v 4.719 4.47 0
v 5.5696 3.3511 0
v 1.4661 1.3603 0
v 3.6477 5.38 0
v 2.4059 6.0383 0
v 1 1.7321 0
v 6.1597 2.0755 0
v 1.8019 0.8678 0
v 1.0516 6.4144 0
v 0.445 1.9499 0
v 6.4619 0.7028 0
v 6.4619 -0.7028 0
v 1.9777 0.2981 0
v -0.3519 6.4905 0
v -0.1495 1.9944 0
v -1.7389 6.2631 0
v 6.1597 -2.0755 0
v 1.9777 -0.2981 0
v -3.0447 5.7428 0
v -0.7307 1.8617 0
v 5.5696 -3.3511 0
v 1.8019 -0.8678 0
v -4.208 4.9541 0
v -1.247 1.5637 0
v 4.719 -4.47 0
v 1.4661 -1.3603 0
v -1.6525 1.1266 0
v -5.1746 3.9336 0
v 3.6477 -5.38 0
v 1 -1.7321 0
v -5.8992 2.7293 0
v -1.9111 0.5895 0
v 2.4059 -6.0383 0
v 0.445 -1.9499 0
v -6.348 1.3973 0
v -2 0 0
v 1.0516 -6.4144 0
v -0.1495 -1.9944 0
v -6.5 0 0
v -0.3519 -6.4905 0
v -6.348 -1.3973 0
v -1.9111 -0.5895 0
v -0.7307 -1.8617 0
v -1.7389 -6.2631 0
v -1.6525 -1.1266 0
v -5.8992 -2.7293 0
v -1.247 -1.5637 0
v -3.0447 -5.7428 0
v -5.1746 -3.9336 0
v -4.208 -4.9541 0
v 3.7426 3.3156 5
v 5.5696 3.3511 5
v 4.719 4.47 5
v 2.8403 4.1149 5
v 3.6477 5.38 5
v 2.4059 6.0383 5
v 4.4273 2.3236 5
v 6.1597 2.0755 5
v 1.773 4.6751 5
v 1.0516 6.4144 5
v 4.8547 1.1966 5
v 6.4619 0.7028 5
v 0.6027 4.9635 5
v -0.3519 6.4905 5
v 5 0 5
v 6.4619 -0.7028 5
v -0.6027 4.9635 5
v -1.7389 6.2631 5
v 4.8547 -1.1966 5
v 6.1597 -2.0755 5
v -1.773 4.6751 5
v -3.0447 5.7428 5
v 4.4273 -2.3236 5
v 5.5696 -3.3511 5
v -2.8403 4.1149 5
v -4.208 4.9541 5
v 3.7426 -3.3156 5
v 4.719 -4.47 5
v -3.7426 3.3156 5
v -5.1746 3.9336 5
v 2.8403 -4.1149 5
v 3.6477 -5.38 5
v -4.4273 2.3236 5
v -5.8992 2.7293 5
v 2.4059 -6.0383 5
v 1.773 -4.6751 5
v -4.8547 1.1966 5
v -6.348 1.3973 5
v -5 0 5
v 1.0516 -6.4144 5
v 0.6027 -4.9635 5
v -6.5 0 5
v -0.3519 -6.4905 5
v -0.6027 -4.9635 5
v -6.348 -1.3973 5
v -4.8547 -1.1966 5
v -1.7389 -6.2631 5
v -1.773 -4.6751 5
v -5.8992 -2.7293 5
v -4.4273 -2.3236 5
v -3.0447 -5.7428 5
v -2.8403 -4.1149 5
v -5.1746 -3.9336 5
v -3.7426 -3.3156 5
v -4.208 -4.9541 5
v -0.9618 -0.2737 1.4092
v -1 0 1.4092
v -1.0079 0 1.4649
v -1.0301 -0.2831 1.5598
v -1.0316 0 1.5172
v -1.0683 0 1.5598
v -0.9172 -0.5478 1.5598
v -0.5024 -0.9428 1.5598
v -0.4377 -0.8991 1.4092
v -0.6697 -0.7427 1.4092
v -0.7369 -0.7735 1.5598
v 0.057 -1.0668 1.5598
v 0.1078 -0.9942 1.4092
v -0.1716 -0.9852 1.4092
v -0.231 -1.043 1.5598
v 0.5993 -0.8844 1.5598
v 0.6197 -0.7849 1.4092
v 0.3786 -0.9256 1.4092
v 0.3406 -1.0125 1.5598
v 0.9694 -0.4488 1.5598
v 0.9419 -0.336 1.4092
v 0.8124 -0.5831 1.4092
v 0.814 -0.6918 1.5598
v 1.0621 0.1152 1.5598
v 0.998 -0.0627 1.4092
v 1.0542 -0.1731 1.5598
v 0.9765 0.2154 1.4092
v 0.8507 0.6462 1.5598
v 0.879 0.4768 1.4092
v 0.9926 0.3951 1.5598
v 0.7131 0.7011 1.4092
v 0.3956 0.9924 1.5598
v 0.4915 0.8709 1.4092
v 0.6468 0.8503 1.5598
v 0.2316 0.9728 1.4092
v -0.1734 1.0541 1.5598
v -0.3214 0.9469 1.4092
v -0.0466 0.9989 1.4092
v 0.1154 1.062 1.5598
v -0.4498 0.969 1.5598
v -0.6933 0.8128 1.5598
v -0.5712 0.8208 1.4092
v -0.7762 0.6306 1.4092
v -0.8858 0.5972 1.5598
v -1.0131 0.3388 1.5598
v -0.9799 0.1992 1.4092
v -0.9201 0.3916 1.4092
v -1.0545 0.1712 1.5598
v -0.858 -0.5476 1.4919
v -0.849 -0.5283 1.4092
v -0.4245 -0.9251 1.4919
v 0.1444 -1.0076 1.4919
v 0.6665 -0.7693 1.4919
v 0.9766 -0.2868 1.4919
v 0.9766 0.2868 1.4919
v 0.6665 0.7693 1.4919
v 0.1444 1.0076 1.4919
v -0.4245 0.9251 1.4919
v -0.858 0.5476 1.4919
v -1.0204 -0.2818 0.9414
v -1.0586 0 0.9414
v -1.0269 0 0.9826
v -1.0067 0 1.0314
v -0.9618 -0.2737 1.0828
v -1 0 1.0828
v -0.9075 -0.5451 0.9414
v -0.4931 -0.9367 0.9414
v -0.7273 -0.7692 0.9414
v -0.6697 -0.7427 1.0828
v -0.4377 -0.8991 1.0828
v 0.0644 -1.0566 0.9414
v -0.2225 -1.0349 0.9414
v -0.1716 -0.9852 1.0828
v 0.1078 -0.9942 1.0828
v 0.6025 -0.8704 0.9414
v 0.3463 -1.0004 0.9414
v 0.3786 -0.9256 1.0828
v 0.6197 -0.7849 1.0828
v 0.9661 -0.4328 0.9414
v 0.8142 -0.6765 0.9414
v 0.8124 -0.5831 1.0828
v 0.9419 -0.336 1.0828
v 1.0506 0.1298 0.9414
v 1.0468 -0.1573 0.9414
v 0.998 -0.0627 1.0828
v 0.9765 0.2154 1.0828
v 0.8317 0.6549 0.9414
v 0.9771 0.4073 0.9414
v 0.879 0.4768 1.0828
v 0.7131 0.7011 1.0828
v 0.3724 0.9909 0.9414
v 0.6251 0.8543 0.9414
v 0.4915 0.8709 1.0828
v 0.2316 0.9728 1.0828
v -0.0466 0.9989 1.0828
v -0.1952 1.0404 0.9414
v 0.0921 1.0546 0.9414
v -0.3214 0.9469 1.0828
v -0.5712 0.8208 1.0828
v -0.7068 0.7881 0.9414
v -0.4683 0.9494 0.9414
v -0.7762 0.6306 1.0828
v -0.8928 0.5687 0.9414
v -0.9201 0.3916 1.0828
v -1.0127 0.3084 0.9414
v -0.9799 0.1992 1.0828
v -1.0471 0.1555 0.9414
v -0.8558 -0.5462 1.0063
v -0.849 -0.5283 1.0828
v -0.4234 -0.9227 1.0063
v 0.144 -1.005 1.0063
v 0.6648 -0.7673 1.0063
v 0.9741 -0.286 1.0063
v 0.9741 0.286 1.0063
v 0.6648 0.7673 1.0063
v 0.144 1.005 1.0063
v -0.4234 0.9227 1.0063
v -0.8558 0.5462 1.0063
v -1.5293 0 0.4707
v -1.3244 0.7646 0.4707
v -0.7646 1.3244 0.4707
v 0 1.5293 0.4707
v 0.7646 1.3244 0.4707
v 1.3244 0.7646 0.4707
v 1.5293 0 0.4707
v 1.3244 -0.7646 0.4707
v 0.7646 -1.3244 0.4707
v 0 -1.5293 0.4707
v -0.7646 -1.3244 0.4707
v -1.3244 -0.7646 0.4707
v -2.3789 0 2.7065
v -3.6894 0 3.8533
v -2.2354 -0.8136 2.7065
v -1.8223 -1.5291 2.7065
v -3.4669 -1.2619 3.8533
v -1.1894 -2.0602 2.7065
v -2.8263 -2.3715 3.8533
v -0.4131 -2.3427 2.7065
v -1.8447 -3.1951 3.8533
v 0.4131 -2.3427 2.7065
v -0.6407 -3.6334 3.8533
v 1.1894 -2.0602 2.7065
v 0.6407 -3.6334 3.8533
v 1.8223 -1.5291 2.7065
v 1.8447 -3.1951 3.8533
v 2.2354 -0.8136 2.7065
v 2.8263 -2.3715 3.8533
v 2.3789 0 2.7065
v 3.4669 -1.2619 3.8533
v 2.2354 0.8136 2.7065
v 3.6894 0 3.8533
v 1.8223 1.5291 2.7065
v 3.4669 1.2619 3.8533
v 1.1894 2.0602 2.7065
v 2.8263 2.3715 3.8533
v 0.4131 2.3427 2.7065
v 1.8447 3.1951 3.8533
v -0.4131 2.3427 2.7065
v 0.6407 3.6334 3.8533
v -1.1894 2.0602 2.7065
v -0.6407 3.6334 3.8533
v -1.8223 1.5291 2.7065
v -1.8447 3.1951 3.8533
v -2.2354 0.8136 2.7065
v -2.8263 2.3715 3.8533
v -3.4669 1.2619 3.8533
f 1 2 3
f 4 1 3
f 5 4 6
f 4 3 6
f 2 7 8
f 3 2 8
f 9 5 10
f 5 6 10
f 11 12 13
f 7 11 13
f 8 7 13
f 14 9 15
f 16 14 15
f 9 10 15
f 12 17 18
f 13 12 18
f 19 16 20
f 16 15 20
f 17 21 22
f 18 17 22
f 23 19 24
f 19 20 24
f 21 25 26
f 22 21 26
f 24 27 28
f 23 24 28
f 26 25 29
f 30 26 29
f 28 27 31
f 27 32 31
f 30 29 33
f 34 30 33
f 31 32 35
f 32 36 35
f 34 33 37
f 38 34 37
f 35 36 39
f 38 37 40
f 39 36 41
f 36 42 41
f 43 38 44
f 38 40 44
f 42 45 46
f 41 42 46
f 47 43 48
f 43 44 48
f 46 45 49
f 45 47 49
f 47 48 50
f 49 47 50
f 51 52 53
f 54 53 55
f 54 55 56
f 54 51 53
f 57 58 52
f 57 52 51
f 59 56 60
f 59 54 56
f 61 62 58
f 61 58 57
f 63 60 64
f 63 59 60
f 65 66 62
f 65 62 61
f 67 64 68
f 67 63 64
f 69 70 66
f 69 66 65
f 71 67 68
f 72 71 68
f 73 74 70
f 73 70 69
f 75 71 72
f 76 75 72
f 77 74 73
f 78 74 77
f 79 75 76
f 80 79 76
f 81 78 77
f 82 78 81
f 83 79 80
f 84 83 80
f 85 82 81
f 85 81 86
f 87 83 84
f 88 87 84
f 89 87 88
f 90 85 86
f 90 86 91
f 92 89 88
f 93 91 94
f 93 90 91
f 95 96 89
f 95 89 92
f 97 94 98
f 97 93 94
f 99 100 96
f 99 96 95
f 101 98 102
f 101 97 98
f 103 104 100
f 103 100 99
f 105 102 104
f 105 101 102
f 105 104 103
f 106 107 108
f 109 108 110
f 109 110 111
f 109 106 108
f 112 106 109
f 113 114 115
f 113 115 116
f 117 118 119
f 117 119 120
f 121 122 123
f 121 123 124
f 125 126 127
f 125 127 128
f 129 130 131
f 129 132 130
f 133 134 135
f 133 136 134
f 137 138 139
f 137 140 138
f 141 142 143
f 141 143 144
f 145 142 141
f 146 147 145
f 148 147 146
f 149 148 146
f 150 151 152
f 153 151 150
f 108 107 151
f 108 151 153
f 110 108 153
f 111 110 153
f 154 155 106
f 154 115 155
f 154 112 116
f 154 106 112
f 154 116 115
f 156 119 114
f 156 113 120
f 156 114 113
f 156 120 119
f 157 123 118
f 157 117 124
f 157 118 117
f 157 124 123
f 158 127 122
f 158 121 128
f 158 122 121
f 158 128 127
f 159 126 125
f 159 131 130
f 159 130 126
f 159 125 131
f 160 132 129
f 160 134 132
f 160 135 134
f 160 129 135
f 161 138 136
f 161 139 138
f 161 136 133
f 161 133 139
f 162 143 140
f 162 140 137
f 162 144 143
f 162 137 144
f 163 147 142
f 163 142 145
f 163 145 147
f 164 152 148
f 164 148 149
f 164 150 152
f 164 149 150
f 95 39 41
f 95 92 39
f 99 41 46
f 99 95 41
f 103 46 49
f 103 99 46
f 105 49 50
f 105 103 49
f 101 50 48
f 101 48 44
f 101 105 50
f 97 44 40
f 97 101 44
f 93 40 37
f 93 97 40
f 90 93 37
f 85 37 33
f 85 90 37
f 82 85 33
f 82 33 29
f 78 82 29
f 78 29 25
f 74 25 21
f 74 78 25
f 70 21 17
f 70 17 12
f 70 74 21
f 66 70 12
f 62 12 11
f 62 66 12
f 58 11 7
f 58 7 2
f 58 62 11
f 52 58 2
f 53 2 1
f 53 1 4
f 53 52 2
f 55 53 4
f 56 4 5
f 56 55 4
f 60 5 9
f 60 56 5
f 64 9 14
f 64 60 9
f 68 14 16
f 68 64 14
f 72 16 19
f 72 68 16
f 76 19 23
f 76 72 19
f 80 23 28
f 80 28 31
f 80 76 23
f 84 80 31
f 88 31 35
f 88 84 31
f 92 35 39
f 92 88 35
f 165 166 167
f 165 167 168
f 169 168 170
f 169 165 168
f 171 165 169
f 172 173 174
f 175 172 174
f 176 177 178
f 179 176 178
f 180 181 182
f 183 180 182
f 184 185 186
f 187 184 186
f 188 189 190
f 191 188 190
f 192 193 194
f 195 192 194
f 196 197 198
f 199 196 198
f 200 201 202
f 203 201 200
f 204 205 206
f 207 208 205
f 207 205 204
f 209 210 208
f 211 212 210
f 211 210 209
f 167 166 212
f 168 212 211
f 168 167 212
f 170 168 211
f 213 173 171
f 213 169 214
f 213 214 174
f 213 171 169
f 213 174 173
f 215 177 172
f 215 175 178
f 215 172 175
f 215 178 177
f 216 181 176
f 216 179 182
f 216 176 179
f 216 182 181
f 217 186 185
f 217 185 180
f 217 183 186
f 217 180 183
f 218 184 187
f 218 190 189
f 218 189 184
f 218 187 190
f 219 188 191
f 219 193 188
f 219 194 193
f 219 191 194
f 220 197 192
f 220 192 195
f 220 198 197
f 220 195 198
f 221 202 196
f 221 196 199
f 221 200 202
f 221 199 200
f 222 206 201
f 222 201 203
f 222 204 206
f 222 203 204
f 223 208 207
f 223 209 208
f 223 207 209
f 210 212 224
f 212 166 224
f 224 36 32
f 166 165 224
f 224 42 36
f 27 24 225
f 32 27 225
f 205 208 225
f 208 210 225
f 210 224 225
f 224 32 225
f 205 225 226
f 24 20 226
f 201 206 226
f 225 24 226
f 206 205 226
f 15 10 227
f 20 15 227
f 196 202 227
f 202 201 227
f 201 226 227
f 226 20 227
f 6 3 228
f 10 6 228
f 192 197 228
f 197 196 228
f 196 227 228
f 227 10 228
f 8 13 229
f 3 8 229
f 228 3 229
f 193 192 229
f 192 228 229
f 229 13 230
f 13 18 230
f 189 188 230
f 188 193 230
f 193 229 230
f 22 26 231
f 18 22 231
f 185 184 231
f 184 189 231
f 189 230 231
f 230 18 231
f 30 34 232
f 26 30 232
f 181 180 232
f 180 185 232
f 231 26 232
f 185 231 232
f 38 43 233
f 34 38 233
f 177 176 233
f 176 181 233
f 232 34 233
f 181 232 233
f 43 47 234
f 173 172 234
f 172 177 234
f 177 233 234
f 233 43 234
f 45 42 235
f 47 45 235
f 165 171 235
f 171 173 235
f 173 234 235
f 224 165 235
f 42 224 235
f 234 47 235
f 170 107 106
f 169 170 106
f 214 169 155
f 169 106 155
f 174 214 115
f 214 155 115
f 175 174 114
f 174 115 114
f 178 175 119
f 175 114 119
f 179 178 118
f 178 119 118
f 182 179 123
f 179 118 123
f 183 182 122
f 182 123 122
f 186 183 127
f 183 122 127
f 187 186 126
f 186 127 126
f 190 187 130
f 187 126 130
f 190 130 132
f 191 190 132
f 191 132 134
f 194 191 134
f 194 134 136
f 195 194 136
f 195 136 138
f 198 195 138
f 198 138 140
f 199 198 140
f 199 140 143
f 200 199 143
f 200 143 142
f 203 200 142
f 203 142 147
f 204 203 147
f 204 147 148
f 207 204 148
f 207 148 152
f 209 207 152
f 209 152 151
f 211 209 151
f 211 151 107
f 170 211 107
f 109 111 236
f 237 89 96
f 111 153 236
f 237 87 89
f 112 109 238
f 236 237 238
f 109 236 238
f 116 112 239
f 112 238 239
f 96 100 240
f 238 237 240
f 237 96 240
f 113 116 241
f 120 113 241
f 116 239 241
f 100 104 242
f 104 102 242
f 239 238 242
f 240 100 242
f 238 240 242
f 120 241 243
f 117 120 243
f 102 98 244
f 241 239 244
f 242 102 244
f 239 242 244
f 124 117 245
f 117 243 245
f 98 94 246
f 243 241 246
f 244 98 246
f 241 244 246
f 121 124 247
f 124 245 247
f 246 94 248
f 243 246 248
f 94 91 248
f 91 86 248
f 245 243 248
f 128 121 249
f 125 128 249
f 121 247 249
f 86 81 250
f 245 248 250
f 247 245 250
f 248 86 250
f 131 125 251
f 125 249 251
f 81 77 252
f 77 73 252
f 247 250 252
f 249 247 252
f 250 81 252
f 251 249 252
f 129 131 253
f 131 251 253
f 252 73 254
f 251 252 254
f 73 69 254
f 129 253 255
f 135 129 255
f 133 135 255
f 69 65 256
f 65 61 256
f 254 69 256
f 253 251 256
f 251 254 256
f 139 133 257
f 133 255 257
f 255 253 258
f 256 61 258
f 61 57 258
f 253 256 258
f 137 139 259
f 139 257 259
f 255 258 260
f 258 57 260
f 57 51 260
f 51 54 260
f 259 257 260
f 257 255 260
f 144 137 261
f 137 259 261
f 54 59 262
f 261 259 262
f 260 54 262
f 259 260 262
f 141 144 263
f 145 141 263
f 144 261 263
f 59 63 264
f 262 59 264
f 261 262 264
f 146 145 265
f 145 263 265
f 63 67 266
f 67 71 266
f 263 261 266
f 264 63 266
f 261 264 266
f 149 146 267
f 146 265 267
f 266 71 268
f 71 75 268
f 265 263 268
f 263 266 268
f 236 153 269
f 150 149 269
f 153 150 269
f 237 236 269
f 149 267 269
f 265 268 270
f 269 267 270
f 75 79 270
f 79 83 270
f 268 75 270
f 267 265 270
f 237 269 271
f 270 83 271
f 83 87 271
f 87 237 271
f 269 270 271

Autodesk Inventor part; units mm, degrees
ref_plane "YZ Plane" through (0, 0, 0) normal (1, 0, 0) x (0, 1, 0)
ref_plane "XZ Plane" through (0, 0, 0) normal (0, 1, 0) x (-1, 0, 0)
ref_plane "XY Plane" through (0, 0, 0) normal (0, 0, 1) x (1, 0, 0)
sketch "Sketch2" plane through (0, 0, 0) normal (0, 1, 0) x (-1, 0, 0)
  line L0 (6.5, 0) -> (6.5, 5)
  line L1 (6.5, 5) -> (5, 5)
  line L2 (6.5, 5) -> (6.5, 0)
  line L3 (0, -1) -> (0, 6) projected
  line L4 (6.5, 0) -> (2, 0)
  line L5 (2, 0) -> (1, 1)
  line L6 (1, 1) -> (1, 1.5)
  line L7 (5, 5) -> (1, 1.5)
  point P0 (0, 0)
  dimension "d4" = 5
  dimension "d5" = 1.5
  dimension "d11" = 6.5
  dimension "d26" = 4.5
  dimension "d27" = 0.5
  dimension "d28" = 1
  dimension "d29" = 2
  dimension "d31" = 1
revolve "Revolution2" add sketch "Sketch2" angle 360 about axis through (0, 0, -10) along (0, 0, 1)
fillet "Fillet4" radius 0.2 2 edges at (1, 0, 1) (1, 0, 1.5)
properties part number "nozzle_big" material "Glass"
